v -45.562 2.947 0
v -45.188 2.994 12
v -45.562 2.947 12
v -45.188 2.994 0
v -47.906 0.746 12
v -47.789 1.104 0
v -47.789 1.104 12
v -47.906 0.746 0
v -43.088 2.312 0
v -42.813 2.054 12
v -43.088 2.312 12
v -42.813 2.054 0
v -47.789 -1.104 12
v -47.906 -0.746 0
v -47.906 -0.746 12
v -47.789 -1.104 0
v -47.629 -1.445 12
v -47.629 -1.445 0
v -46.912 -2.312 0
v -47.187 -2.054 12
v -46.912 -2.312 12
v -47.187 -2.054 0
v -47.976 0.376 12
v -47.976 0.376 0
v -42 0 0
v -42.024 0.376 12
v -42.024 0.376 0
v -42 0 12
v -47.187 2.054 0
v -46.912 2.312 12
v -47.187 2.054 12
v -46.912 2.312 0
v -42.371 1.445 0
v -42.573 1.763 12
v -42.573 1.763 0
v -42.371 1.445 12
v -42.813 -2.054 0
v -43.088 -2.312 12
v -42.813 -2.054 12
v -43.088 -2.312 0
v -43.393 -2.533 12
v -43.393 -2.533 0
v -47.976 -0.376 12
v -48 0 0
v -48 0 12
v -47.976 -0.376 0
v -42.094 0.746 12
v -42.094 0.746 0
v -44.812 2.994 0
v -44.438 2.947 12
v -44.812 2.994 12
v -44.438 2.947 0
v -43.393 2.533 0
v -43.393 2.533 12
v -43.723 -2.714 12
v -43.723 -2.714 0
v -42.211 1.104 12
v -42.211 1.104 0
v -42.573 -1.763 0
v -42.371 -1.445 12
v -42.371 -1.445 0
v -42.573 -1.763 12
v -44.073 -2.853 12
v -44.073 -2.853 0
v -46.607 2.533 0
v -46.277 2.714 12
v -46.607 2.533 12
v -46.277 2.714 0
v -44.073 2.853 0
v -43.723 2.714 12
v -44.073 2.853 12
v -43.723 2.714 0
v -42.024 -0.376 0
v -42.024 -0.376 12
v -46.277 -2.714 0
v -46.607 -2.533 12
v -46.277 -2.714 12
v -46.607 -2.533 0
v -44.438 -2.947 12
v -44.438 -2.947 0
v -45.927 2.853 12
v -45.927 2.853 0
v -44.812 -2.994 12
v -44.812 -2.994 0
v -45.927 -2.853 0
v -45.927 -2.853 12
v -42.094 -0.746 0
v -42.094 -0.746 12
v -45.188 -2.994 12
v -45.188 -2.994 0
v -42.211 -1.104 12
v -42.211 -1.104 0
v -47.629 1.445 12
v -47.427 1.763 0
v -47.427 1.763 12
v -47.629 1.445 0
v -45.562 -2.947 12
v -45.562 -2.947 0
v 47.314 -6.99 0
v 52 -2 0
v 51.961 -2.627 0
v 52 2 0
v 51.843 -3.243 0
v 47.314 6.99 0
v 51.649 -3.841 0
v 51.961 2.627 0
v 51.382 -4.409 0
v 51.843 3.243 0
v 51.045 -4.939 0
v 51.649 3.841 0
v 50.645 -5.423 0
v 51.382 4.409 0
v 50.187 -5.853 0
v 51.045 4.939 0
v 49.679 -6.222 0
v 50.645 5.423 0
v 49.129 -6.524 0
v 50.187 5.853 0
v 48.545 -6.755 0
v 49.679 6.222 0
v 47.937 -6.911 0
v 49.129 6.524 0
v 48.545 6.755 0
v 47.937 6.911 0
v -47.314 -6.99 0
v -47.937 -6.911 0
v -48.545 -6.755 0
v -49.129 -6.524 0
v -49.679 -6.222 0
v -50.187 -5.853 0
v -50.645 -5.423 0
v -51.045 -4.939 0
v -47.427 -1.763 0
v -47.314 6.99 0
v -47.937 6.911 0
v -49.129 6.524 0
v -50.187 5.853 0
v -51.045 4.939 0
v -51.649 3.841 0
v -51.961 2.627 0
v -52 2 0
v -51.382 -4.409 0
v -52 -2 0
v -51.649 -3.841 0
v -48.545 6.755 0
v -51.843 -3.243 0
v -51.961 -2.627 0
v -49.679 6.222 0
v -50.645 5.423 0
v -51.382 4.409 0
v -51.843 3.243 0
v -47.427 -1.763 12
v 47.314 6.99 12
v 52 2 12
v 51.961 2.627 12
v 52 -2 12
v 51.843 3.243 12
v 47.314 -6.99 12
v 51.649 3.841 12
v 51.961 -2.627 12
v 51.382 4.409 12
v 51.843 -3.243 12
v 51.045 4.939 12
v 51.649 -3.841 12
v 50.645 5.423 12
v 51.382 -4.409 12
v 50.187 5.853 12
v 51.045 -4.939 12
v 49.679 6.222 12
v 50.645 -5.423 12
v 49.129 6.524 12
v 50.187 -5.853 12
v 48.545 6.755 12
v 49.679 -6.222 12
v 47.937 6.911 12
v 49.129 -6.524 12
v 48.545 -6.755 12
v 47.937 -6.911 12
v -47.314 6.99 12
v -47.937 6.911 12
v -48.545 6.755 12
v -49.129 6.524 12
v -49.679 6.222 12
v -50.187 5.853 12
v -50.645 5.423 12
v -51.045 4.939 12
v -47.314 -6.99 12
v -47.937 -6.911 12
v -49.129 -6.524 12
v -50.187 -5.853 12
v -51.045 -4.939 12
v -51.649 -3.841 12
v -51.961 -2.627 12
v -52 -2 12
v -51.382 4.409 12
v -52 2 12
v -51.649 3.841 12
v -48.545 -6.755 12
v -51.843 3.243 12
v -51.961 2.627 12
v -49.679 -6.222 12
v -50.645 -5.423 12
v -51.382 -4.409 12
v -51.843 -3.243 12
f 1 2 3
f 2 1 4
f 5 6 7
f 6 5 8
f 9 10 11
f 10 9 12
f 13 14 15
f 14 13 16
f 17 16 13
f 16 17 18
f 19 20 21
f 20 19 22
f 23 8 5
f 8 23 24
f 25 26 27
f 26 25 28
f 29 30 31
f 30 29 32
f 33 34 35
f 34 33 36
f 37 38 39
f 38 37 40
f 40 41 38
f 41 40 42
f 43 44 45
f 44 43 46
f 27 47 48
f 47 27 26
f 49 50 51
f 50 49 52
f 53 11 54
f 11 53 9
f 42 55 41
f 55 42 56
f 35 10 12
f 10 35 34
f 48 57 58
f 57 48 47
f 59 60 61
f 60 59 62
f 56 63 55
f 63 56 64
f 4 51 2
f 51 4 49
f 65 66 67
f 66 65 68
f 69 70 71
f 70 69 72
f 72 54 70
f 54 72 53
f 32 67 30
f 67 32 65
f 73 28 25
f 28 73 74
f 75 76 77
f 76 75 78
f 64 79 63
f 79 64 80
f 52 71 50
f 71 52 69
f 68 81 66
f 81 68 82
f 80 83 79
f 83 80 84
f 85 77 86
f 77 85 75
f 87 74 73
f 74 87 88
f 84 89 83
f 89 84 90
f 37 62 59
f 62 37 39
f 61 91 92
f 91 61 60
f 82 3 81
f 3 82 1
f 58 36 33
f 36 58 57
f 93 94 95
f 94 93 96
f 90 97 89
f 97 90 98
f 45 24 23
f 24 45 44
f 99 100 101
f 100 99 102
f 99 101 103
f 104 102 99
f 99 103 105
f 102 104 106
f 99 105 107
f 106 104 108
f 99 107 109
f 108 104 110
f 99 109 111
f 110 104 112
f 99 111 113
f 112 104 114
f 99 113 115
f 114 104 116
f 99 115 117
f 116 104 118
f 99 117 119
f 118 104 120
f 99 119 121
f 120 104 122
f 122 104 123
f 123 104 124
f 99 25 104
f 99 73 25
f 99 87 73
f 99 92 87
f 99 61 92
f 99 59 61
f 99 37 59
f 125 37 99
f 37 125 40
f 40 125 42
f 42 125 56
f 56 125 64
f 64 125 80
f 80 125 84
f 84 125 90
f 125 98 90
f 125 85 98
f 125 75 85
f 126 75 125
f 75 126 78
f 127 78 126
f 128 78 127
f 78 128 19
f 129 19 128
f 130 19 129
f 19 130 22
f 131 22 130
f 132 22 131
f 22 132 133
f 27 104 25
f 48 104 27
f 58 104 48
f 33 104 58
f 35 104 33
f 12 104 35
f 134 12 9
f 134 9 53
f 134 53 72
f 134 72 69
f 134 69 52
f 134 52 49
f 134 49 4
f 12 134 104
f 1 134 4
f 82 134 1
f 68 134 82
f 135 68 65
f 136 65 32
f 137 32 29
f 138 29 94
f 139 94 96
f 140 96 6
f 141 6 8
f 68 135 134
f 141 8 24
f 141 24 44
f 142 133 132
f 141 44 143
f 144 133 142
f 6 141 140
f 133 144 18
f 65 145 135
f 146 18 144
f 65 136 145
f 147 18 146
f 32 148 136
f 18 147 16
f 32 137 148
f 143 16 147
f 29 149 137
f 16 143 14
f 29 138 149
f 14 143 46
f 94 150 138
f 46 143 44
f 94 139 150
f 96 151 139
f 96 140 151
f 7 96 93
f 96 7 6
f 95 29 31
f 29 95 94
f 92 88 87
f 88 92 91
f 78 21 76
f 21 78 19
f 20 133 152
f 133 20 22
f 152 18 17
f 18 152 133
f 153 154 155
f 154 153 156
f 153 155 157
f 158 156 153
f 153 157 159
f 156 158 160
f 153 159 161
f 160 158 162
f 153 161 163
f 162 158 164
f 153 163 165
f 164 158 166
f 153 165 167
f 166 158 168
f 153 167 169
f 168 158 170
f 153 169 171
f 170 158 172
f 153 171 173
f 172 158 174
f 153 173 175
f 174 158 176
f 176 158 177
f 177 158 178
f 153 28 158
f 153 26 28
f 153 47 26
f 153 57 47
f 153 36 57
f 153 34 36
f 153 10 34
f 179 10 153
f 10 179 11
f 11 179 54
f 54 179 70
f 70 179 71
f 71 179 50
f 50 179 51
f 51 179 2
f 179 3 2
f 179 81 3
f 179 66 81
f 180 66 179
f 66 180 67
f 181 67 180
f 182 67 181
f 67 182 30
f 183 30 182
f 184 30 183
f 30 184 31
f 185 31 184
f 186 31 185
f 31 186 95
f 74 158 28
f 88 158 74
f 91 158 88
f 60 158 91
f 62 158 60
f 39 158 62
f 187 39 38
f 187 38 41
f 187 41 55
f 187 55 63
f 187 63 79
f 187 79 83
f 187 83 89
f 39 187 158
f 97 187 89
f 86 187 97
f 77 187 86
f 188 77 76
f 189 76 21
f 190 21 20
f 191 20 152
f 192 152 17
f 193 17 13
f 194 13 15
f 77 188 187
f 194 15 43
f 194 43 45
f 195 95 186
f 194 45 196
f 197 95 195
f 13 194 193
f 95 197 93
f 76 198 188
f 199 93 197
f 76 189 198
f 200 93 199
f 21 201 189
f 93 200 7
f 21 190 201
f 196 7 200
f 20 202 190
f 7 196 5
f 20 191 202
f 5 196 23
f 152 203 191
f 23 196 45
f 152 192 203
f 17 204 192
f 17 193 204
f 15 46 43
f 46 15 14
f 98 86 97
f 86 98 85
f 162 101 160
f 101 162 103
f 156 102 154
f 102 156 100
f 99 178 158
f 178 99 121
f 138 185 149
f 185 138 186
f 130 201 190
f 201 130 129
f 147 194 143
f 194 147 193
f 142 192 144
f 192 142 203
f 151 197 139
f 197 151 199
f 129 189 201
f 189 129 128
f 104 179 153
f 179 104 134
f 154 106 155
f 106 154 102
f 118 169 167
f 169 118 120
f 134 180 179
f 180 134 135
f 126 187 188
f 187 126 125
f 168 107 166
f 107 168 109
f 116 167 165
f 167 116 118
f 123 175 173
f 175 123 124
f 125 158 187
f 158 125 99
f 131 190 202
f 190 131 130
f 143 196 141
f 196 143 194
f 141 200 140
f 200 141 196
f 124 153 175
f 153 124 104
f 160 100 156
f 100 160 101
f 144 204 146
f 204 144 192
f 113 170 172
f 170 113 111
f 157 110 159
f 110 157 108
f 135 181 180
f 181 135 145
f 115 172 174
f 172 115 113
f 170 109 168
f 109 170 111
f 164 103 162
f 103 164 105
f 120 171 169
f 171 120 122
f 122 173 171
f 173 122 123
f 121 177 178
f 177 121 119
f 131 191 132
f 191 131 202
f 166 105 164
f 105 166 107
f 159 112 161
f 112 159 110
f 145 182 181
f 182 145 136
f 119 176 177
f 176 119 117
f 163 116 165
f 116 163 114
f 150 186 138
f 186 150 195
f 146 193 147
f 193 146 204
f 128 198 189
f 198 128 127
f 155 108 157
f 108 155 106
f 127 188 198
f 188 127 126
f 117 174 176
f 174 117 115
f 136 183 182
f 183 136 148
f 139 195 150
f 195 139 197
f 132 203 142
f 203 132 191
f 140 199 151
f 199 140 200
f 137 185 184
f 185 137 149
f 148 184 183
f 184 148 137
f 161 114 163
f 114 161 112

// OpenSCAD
$fn = 50;


difference() {
	union() {
		hull() {
			translate(v = [-47.0000000000, 2.0000000000, 0]) {
				cylinder(h = 12, r = 5);
			}
			translate(v = [47.0000000000, 2.0000000000, 0]) {
				cylinder(h = 12, r = 5);
			}
			translate(v = [-47.0000000000, -2.0000000000, 0]) {
				cylinder(h = 12, r = 5);
			}
			translate(v = [47.0000000000, -2.0000000000, 0]) {
				cylinder(h = 12, r = 5);
			}
		}
	}
	union() {
		translate(v = [-45.0000000000, 0.0000000000, 0]) {
			cylinder(h = 12, r = 3.0000000000);
		}
		translate(v = [-45.0000000000, 0.0000000000, 0]) {
			cylinder(h = 12, r = 1.5000000000);
		}
		translate(v = [-45.0000000000, 0.0000000000, 0]) {
			cylinder(h = 12, r = 1.5000000000);
		}
		translate(v = [-45.0000000000, 0.0000000000, 0]) {
			cylinder(h = 12, r = 1.5000000000);
		}
	}
}
